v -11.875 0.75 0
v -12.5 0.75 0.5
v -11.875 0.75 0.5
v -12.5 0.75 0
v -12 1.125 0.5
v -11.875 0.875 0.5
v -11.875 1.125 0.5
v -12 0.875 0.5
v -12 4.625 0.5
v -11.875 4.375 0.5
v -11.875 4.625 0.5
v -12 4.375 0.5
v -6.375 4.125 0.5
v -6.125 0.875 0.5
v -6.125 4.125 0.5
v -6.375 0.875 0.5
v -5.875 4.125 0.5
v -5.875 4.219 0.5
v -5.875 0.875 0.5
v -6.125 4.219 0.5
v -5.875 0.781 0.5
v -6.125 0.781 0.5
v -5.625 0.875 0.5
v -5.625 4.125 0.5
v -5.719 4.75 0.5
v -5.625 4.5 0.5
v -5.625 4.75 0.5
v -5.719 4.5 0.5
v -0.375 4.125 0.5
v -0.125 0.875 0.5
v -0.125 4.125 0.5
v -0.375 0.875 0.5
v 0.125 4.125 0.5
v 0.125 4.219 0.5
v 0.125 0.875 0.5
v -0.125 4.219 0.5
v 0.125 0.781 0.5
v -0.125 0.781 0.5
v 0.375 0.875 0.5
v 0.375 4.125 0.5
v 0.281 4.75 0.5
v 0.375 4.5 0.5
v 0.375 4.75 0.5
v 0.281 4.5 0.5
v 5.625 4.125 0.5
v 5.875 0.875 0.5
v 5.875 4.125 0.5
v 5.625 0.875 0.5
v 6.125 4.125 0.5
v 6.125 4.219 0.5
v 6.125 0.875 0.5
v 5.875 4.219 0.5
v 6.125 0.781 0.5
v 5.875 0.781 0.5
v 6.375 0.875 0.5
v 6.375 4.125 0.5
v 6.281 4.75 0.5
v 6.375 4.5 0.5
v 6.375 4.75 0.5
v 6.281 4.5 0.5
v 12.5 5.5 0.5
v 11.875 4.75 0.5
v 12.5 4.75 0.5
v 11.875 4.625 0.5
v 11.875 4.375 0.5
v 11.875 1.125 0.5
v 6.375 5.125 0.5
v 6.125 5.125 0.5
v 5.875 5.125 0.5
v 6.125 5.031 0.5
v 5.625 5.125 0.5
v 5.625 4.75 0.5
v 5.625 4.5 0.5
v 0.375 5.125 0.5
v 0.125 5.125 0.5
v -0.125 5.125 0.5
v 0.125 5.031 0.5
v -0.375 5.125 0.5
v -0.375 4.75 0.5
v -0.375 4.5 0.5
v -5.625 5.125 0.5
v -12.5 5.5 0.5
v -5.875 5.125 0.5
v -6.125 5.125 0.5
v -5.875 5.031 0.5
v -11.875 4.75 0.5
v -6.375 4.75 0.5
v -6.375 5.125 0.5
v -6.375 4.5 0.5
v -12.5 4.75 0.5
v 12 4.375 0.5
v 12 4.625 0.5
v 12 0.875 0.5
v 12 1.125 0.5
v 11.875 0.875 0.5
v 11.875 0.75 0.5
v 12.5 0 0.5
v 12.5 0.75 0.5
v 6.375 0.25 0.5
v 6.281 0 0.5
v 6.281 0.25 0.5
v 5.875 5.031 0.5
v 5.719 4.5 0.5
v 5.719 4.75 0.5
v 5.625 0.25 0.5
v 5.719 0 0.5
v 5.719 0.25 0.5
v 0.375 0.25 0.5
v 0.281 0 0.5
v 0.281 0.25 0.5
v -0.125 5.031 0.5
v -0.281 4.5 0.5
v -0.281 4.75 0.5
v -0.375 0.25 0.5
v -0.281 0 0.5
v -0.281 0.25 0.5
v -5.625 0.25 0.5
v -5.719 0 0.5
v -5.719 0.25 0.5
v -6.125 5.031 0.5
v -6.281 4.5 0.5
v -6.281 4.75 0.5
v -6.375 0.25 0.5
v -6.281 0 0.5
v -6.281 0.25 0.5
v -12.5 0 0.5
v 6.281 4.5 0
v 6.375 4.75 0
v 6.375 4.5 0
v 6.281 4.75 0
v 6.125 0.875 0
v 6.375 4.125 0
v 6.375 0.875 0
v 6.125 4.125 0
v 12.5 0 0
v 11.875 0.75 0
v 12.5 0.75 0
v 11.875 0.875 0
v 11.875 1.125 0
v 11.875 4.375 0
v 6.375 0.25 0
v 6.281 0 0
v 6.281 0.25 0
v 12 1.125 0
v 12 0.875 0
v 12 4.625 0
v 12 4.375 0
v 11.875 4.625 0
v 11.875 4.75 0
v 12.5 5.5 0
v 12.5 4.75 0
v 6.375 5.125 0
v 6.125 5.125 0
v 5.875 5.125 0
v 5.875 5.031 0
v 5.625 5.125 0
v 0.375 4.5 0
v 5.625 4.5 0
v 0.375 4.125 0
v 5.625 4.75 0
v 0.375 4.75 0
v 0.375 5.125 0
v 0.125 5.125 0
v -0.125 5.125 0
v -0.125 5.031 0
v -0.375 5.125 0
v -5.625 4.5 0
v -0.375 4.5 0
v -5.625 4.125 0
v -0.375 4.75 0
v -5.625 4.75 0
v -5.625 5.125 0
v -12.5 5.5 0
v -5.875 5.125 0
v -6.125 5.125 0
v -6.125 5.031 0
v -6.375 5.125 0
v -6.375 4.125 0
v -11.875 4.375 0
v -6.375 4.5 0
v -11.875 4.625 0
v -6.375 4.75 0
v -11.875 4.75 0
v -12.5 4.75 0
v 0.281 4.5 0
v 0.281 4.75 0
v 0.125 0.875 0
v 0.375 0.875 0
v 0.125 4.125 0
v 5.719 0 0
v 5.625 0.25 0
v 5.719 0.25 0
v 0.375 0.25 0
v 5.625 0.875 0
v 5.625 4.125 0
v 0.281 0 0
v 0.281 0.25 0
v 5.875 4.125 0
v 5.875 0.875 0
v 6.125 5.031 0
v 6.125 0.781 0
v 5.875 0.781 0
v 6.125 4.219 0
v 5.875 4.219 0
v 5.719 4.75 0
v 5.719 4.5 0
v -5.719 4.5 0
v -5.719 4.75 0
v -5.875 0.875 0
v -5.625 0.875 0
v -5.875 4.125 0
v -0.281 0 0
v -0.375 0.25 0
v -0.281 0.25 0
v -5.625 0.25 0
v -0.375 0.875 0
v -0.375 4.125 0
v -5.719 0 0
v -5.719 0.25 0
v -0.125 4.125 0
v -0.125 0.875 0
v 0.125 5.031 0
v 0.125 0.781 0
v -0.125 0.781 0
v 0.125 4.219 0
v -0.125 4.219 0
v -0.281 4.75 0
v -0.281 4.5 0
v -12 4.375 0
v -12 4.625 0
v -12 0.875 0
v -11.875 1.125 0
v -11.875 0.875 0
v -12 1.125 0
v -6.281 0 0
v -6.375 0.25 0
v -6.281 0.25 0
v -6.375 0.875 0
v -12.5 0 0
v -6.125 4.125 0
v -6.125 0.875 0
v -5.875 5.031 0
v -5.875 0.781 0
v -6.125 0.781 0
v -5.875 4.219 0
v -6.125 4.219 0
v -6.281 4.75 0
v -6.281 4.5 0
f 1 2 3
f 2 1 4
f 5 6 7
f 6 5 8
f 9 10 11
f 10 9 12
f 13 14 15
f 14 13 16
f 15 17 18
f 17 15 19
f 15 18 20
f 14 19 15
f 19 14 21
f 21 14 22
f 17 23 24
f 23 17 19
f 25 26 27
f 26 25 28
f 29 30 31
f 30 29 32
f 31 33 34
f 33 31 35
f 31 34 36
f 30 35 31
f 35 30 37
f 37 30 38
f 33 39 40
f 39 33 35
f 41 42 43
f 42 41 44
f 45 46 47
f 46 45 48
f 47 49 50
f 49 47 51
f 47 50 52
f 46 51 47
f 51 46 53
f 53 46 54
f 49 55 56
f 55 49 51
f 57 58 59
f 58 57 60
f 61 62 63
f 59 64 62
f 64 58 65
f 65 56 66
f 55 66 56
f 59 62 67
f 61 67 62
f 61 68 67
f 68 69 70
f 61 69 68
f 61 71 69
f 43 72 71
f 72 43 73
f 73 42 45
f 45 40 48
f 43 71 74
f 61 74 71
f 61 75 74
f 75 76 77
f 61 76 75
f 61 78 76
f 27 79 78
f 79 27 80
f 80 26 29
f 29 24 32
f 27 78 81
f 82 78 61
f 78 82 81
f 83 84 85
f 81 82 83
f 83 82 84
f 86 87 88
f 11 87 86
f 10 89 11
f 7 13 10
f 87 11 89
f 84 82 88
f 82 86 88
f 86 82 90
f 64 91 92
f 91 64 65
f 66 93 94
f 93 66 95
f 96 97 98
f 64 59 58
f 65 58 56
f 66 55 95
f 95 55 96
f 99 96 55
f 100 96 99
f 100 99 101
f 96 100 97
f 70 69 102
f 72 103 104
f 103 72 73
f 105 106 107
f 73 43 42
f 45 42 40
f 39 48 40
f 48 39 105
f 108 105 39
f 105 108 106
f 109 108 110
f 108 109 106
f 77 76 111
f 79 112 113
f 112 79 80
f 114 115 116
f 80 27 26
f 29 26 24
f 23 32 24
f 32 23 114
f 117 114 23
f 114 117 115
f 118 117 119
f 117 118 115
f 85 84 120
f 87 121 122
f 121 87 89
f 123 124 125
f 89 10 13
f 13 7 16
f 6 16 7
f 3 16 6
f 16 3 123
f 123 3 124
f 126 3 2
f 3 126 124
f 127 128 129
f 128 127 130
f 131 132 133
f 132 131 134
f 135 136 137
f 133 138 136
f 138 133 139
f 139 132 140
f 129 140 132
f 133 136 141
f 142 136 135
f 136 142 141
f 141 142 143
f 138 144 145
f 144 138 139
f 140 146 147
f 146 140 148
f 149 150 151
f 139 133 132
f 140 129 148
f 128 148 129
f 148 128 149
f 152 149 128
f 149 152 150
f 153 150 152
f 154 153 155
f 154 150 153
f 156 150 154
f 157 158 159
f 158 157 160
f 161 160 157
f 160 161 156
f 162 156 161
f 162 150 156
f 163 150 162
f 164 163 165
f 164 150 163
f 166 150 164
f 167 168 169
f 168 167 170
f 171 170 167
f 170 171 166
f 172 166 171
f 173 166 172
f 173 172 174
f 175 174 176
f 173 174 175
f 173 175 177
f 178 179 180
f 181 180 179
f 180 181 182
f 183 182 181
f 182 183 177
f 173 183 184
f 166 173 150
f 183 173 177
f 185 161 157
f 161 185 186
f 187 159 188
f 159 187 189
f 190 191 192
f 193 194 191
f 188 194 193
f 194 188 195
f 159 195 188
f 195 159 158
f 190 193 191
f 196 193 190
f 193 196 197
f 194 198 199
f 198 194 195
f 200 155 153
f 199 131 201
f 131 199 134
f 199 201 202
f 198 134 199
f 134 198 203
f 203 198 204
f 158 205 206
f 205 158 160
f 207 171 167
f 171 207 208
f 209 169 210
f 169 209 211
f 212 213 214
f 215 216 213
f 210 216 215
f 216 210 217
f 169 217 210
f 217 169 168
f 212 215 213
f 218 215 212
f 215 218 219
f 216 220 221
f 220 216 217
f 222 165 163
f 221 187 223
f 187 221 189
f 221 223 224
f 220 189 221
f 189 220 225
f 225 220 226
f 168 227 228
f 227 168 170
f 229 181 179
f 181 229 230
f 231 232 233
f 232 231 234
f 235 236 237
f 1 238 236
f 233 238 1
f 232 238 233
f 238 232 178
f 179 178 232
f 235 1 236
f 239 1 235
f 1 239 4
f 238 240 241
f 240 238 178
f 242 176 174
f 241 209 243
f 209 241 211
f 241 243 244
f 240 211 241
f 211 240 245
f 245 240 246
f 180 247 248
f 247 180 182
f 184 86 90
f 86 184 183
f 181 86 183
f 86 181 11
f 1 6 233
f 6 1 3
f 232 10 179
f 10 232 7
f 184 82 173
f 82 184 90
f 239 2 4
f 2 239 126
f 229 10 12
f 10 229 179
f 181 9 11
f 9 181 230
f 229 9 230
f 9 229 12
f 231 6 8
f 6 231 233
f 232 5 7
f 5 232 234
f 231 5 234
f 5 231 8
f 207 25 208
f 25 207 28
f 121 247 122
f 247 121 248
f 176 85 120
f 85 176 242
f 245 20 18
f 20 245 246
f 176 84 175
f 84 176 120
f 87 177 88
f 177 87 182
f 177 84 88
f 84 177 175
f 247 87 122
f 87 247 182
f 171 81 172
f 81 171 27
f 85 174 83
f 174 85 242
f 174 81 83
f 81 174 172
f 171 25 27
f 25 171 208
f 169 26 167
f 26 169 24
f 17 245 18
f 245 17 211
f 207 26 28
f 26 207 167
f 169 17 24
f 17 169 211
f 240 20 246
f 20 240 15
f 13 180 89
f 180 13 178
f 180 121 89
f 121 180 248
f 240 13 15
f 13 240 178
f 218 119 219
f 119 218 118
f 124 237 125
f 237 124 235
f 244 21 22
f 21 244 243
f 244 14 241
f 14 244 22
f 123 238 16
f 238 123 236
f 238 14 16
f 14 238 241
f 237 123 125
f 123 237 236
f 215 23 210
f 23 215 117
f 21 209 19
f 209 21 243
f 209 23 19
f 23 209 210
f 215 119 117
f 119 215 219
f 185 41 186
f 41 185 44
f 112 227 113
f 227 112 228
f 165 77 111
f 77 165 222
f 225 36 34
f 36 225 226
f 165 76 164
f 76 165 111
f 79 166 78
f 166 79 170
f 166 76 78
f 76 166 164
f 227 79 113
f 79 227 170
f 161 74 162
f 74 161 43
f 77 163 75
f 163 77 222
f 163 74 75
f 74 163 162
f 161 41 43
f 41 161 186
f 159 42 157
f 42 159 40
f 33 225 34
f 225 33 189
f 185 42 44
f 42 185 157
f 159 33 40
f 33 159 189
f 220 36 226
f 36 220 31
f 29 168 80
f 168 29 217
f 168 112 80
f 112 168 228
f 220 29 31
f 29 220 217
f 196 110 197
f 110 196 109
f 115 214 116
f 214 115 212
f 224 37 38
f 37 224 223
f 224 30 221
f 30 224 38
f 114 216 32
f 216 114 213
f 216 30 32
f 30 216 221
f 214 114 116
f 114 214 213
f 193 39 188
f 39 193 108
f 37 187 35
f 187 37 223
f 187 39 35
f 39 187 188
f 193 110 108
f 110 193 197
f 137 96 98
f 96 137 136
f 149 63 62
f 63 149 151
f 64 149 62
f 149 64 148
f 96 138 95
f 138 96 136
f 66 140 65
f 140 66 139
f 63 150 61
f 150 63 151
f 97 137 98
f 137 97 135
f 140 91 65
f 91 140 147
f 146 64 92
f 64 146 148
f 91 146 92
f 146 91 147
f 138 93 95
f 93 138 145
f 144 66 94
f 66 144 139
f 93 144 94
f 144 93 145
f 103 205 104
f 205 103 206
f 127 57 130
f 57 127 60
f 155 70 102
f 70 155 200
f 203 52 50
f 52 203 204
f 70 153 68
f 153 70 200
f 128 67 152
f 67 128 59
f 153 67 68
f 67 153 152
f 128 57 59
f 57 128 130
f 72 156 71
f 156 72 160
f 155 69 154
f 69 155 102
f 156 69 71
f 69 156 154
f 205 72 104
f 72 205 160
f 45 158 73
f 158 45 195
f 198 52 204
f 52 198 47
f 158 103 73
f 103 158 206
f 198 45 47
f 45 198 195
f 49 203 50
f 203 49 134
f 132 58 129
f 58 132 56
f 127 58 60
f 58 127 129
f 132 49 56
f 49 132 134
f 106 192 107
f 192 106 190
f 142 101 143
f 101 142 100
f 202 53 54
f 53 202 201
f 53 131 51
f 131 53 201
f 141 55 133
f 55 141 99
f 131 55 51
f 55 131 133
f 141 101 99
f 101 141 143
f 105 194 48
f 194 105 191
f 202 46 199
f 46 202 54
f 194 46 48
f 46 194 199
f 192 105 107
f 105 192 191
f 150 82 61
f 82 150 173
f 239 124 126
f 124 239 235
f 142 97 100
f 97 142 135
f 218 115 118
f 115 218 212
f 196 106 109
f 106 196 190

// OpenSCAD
// file: modus.scad
//Corner Joint - allows the sides of two parts to create inlayed corner. Aids with welding.
//need to verify module math is the same throughout all parts.

module cornerjoint(Z,L,H,EndGap,PadL,PadH,CJangle,CJcenter){
    //change so that H = Z of inlayed part (usually 0.5)
    //add center and angle in degrees option, orgin far side of cut out area

     if((CJangle==0)&&(CJcenter==0))
      {    
        translate([0,0,0])
        rotate([0,0,CJangle])
        difference(){
        cube([L,H+PadH,Z]);
        translate([EndGap,H,0])
        cube([PadL,PadH,Z]);
        translate([L-EndGap-PadL,H,0])
        cube([PadL,PadH,Z]);}
      }    
else if((CJangle==90)&&(CJcenter==0))
      {    
        translate([H+PadH,0,0])
        rotate([0,0,CJangle])
        difference(){
        cube([L,H+PadH,Z]);
        translate([EndGap,H,0])
        cube([PadL,PadH,Z]);
        translate([L-EndGap-PadL,H,0])
        cube([PadL,PadH,Z]);}
      }
else if((CJangle==180)&&(CJcenter==0))       
      {    
        translate([L,H+PadH,0])
        rotate([0,0,CJangle])
        difference(){
        cube([L,H+PadH,Z]);
        translate([EndGap,H,0])
        cube([PadL,PadH,Z]);
        translate([L-EndGap-PadL,H,0])
        cube([PadL,PadH,Z]);}
      }
else if((CJangle==270)&&(CJcenter==0))
      {    
        translate([0,L,0])
        rotate([0,0,CJangle])
        difference(){
        cube([L,H+PadH,Z]);
        translate([EndGap,H,0])
        cube([PadL,PadH,Z]);
        translate([L-EndGap-PadL,H,0])
        cube([PadL,PadH,Z]);}
      }  
      
//centered     
   
else if((CJangle==0)&&(CJcenter==1))
      {    
        translate([-L/2,0,0])
        rotate([0,0,CJangle])
        difference(){
        cube([L,H+PadH,Z]);
        translate([EndGap,H,0])
        cube([PadL,PadH,Z]);
        translate([L-EndGap-PadL,H,0])
        cube([PadL,PadH,Z]);}
      }  
else if((CJangle==90)&&(CJcenter==1))
      {    
        translate([0,-L/2,0])
        rotate([0,0,CJangle])
        difference(){
        cube([L,H+PadH,Z]);
        translate([EndGap,H,0])
        cube([PadL,PadH,Z]);
        translate([L-EndGap-PadL,H,0])
        cube([PadL,PadH,Z]);}
      }
else if((CJangle==180)&&(CJcenter==1))       
      {    
        translate([L/2,0,0])
        rotate([0,0,CJangle])
        difference(){
        cube([L,H+PadH,Z]);
        translate([EndGap,H,0])
        cube([PadL,PadH,Z]);
        translate([L-EndGap-PadL,H,0])
        cube([PadL,PadH,Z]);}
      }
else if((CJangle==270)&&(CJcenter==1))
      {    
        translate([0,L/2,0])
        rotate([0,0,CJangle])
        difference(){
        cube([L,H+PadH,Z]);
        translate([EndGap,H,0])
        cube([PadL,PadH,Z]);
        translate([L-EndGap-PadL,H,0])
        cube([PadL,PadH,Z]);}
      }
} //end cornerjoint module

//Tab Insert - used to cut a hole for an abutting part to insert into. Typically aids with welding the two parts.
module tabinsert(X,Y,Z,dGap,cGap,c1,c2,c3,c4,c5,c6,c7,c8,center){
    translate([-dGap-(center*(X/2)),-dGap-(center*(Y/2)),0]){
        //main cut
        cube([X+(dGap*2),Y+(dGap*2),Z]);
        //corner c1c2
        translate([-cGap,(Y+(dGap*2))-c1+cGap,0])
            {
        cube([c2,c1,Z]);}
       //corner c3c4
       translate([(X+(dGap*2))-c3+cGap,(Y+(dGap*2))-c4+cGap,0]){
           cube([c3,c4,Z]);
       }
       //corner c5c6
       translate([(X+(dGap*2))-c6+cGap,-cGap,0])
      {
          cube([c6,c5,Z]);
      }
       
       //corner c7c8 
       translate([-cGap,-cGap,0]){
           cube([c7,c8,Z]);
       }
    
    } //end center translate
} //end tabinsert module
 

module nut(flattoflat,nutheight){  //distance from one flat side to the other flat side "A/F"

//typical sizes found here:
//https://en.wikipedia.org/wiki/Nut_(hardware)

difference(){
    translate([0,0,nutheight/2])
cube(size = [10,10,nutheight], center = true);
    
for(i=[1:6]){
    rotate([0,0,i*60])
difference(){
    translate([-10,0,0])
    cube([20,20,nutheight]);
    translate([-10,0,0])
    cube([20,flattoflat/2,nutheight]);
}  //end difference
}  //end for
}  //end differeence
}  //end module
// file: vars.scad
brickW=6; 
brickL=24;
brickCH=6; //Is brick height being shortened by d1z??

//3.625 x 2.25 x 8
//6 x 12 x 6

grateX=56;
grateY=23;
grateH=37; //Height mounted above press's frame
grateA=17.5; //angle of grate

//grateX=56;
//grateY=23;
//grateH=37; //Height mounted above press's frame
//grateA=17.5; //angle of grate


$fn=8; //defines resolution of circles. 8 is okay for review. 100  or greater should be used for for final dxf export.

dZstandard=0.5; //thickness of steel to be cut for drawer parts
fZstandard=0.5;
aZstandard=0.5; //thickness of steel to be cut for arm parts
hZstandard=0.125;

fBOLTHOLEstandardD=1; //standard bolts used on frame
aBOLTHOLEstandardD=1;

sliderodholeOD=1.2; 
d1bushingOD=1.25;
d1bushingL=1.25;
d1shaftOD=1;
d1bolt1OD=1;
d1bolt2OD=0.75;
d1nut2AF=1.25;
d1nut2H=0.665;


dGap=0.03125; //gap between a hole cut's edge and the part sitting within the hole. //D3 appears to use 0.3125, is this in error?

//all parts set to standard thickness below
//off standard preferences can be defined below

//drawer
drawergap=0.0283;  //extra room for drawer to slide in the space between f1 and f4
drawerHgap=0.1884;  //total extra space from drawer sides to frame walls. sum of both sides.

d2clevispinaccessholeOD=3;

d1z=dZstandard;
d2z=dZstandard;
d3z=dZstandard;
d4z=dZstandard;
d5z=dZstandard;
d6z=dZstandard;
d5z=dZstandard;
d7z=dZstandard;
d8z=dZstandard;
d9z=dZstandard;

d11z=dZstandard;
d12z=dZstandard;


//frame

f1y=6;
f1z=fZstandard;


f2y=3.5;
f2z=fZstandard;

f3y=3.5;
f3z=fZstandard;

f4y=11;
f4z=fZstandard;

f5y=3.5;
f5z=fZstandard;

f6y=8;
f6z=fZstandard;

f8y=brickW;
f8z=fZstandard;
f8boltD=1;

f9y=4.5;

f9z=fZstandard;




f12z=fZstandard;   

f11x=1.25;
f11z=fZstandard;

f13z=fZstandard;

f14y=3.5;
f14z=fZstandard;

//arms

a1x=4;
a1z=aZstandard;
a1out=24; //length from frame to A5 edge for bricks to sit on as they exit

a2x=6;
a2z=aZstandard;

a3x=4;
a3y=72;
a3z=aZstandard;

a4x=6;
a4y=72;
a4z=aZstandard;

a5x=6;
a5y=72;
a5z=aZstandard;

a6z=aZstandard;

//guards

h1x=grateX;
h1y=grateH;  //might need to tweak for grate thickness

h1z=hZstandard;
h2z=hZstandard;
h3z=hZstandard;
h4z=hZstandard;
h5z=hZstandard;
h6z=hZstandard;
h7z=hZstandard;
h8z=hZstandard;

//
//Input your main cylinder's dimenions here
//
cylMainBore = 5;
cylMainStroke = 16;
cylMainExt = 43;
cylMainRet = 27;
cylMainA = (cylMainRet-cylMainStroke); //center to center minus stroke length
cylMainB = 0.25; // cylinder wall thickness
cylMainD = 2.5; //Rod OD
cylMainE = 5.75; //rear pin holder width
cylMainG = 4; //rod pin holder width
cylMainJ = 3.8; //distance from the end of the cylinder body to rod pin center
cylMainR = 1.52; //pin hole ID
cylMainS = 2.5; //pin holder OD

//
//Input your drawer cylinder's dimenions here
//
//
cylDrawerBore = 5;
cylDrawerStroke = 16;
cylDrawerExt = 43;
cylDrawerRet = 27;
cylDrawerA = (cylMainRet-cylMainStroke); //center to center minus stroke length
cylDrawerB = 0.25; // cylinder wall thickness
cylDrawerD = 2.5; //Rod OD
cylDrawerE = 5.75; //rear pin holder width
cylDrawerG = 4; //rod pin holder width
cylDrawerJ = 3.8; //distance from the end of the cylinder body to rod pin center
cylDrawerR = 1.52; //pin hole ID
cylDrawerS = 2.5; //pin holder OD

cylinderDRAWERbodyH=3; //measured when in position, largest length from top to bottom of cylinder
cylinderDRAWERminC2C=0; //drawer's hydraulic cylinder's distance from the center of one mounting hole to the center of the other when fully compressed.
cylinderDRAWERmaxC2C=0; ///drawer's hydraulic cylinder's distance from the center of one mounting hole to the center of the other when fully extended.
cylinderDRAWERrodclevisW=2.5; //width of cylinders' clevis on end of rod
cylinderDRAWERrodclevisID=1;
cylinderDRAWERrodclevisOD=2;
cylinderDRAWERrearclevisW=2.5; //width of mounting clevis cylinder body
cylinderDRAWERrearclevisID=1;
cylinderDRAWERrearclevisOD=2;
cylinderDRAWERrearclevisClearance=3; //usable space around rear clevis pin (in diameter). be aware of hyraulic fittings.

//the following variables are calculated in order of dependence on preceding variables

d3x=brickL+(d2z*2);
d3y=brickCH-d1z;
d4x=brickW+d3z+d3z;
d4y=brickCH-d1z;
d5x=brickL+(d2z*2);
d5y=brickW;
d6x=brickL+(d2z*2);
d6y=brickCH;
d7x=cylinderDRAWERrearclevisClearance;
d7y=a4z+d8z+cylinderDRAWERbodyH;
d9x=cylinderDRAWERbodyH+d6z; //should be based on clevis size?
d9y=cylinderDRAWERbodyH+d8z;
d8x=brickL+(d2z*2);
d8y=max(5,(d9x-d6z));   //need to review fundamentals, 5 minimun unless d9 gets larger than d8
d11x=1.5+(d1bolt1OD*2)+d1bushingOD;
d11y=max((0.5+d1bushingL),4);

d12x=d8x;
d12y=d11y+1;

f1x=((brickL+(d2z*2)+drawerHgap+(f9y*2)));
f3x=f1x;

d1x=(brickL+d2z+d2z);
//d1x=(((f1x/2)-(((brickL+(d2z*2)+drawerHgap)/2)-fZstandard-(sliderodholeOD/2)))+(d11x/2))*2;
d1y=((brickW+d3z+d3z)*3)+1;

d2x=d8y+d6z+brickW+d3z+d5y+d3z;
d2y=brickCH;



f11y=f8y;
f6x=brickL+(d2z*2)+(f9y*2)+drawerHgap;

f9x=(f2z+((cylMainS+0.125)/2)+cylMainRet-cylMainJ+1+f4y+drawergap+d2y+f1y);  //leaves 1" between top of cylinder and bottom of F4
f8x=f9x;


f2x=brickL+(d2z*2)+drawerHgap+(f9y*2)-(1.4*2);  //distance between large cut outs in f9

f5x=brickL+(d2z*2)+drawerHgap+(f9y*2)+(a1x*2); //distance between outer edges of each A1

f4x=f5x-0.5;   //same as f5 but minus 0.25 on each side to give a little overhang

f14x=brickL+(1*2)+(.125*2)+(dGap*2); 

f12x=f3x;
f12y=(f3y*2)+brickW;

sliderodoffset=(((brickL+(d2z*2)+drawerHgap)/2)-fZstandard-(sliderodholeOD/2));

distancetof8center=(cylDrawerExt+(a4x/2)+((d9x-d6z)/2)+d6z+(brickW/2)); //F8 center on A1

a1y=distancetof8center+(brickW/2)+a1out;
a2y=a1y;

h7x=f5x-((a1x/2)*2)+(1.5*2);
h7y=cylDrawerStroke;

h8x=f5x-((a1x/2)*2)+(1.5*2);
h8y=a1out-a5x-f5y;  //distance between a5 and f5

hopperBaseX=brickL;
hopperBaseY=brickW;

h2x=grateX;
h2y=sqrt(((h1y-(sin(grateA)*grateY))*(h1y-(sin(grateA)*grateY)))+(((cos(grateA)*grateY)-hopperBaseY)*((cos(grateA)*grateY)-hopperBaseY)));

//h1y-(sin(grateA)*grateY)
//(cos(grateA)*grateY)-hopperBaseY

echo(h1y-(sin(grateA)*grateY));
echo((cos(grateA)*grateY)-hopperBaseY);
echo(h2y);
echo(atan((h1y-(sin(grateA)*grateY))/((cos(grateA)*grateY)-hopperBaseY)));
echo((h1y-(sin(grateA)*grateY))/(h1y));

// ECHO - REQUIRED PARTS BASED ON INPUTS

echo(str("Minimum drawer cylinder stroke length: ",(d3z*2)+d5y+brickW));
//would be cool to validate and confirm user inputed stroke length. set error=1; if drawer cylinder is not long enough. print an echo warning.

echo(str("Grate hieght above ground level: ",(1)));
// main file
include <vars.scad>;
use <modus.scad>;

//this part is rendered upside down from placement

d3p();

module d3p(){

difference(){
translate([-(d3x/2),0,0])
cube([d3x,d3y,d3z]);
translate([-(d3x/2),0,0])
cuts();
translate([(d3x/2),0,0])
mirror([1,0,0])
cuts();
} //end difference

module cuts(){
    translate([0,d3y/2,0])
    cornerjoint(d3z,d3y-(0.75*2),d2z,0.125,0.25,0.125,270,1);    
    
    //outer columns tab inserts
    
    translate([(brickL/4)+d2z,d3y-d5z-(0.75/2),0])
    tabinsert(d4z,0.75,d3z,dGap,0.09375,0.375,0.25,0.25,0.375,0.375,0.25,0.25,0.375,1);

    translate([(brickL/4)+d2z,0,0])
    tabinsert(d4z,(0.75*2),d3z,dGap,0.09375,0.625,0.25,0.25,0.625,0,0,0,0,1);
    
    //center column tab inserts
    
    translate([d3x/2,d3y-d5z-(0.75/2),0])
    tabinsert(d4z,0.75,d3z,dGap,0.09375,0.375,0.25,0.25,0.375,0.375,0.25,0.25,0.375,1); 

    translate([d3x/2,0,0])
    tabinsert(d4z,(0.75*2),d3z,dGap,0.09375,0.625,0.25,0.25,0.625,0,0,0,0,1);
    
} //end cuts module

} //end d3p module
